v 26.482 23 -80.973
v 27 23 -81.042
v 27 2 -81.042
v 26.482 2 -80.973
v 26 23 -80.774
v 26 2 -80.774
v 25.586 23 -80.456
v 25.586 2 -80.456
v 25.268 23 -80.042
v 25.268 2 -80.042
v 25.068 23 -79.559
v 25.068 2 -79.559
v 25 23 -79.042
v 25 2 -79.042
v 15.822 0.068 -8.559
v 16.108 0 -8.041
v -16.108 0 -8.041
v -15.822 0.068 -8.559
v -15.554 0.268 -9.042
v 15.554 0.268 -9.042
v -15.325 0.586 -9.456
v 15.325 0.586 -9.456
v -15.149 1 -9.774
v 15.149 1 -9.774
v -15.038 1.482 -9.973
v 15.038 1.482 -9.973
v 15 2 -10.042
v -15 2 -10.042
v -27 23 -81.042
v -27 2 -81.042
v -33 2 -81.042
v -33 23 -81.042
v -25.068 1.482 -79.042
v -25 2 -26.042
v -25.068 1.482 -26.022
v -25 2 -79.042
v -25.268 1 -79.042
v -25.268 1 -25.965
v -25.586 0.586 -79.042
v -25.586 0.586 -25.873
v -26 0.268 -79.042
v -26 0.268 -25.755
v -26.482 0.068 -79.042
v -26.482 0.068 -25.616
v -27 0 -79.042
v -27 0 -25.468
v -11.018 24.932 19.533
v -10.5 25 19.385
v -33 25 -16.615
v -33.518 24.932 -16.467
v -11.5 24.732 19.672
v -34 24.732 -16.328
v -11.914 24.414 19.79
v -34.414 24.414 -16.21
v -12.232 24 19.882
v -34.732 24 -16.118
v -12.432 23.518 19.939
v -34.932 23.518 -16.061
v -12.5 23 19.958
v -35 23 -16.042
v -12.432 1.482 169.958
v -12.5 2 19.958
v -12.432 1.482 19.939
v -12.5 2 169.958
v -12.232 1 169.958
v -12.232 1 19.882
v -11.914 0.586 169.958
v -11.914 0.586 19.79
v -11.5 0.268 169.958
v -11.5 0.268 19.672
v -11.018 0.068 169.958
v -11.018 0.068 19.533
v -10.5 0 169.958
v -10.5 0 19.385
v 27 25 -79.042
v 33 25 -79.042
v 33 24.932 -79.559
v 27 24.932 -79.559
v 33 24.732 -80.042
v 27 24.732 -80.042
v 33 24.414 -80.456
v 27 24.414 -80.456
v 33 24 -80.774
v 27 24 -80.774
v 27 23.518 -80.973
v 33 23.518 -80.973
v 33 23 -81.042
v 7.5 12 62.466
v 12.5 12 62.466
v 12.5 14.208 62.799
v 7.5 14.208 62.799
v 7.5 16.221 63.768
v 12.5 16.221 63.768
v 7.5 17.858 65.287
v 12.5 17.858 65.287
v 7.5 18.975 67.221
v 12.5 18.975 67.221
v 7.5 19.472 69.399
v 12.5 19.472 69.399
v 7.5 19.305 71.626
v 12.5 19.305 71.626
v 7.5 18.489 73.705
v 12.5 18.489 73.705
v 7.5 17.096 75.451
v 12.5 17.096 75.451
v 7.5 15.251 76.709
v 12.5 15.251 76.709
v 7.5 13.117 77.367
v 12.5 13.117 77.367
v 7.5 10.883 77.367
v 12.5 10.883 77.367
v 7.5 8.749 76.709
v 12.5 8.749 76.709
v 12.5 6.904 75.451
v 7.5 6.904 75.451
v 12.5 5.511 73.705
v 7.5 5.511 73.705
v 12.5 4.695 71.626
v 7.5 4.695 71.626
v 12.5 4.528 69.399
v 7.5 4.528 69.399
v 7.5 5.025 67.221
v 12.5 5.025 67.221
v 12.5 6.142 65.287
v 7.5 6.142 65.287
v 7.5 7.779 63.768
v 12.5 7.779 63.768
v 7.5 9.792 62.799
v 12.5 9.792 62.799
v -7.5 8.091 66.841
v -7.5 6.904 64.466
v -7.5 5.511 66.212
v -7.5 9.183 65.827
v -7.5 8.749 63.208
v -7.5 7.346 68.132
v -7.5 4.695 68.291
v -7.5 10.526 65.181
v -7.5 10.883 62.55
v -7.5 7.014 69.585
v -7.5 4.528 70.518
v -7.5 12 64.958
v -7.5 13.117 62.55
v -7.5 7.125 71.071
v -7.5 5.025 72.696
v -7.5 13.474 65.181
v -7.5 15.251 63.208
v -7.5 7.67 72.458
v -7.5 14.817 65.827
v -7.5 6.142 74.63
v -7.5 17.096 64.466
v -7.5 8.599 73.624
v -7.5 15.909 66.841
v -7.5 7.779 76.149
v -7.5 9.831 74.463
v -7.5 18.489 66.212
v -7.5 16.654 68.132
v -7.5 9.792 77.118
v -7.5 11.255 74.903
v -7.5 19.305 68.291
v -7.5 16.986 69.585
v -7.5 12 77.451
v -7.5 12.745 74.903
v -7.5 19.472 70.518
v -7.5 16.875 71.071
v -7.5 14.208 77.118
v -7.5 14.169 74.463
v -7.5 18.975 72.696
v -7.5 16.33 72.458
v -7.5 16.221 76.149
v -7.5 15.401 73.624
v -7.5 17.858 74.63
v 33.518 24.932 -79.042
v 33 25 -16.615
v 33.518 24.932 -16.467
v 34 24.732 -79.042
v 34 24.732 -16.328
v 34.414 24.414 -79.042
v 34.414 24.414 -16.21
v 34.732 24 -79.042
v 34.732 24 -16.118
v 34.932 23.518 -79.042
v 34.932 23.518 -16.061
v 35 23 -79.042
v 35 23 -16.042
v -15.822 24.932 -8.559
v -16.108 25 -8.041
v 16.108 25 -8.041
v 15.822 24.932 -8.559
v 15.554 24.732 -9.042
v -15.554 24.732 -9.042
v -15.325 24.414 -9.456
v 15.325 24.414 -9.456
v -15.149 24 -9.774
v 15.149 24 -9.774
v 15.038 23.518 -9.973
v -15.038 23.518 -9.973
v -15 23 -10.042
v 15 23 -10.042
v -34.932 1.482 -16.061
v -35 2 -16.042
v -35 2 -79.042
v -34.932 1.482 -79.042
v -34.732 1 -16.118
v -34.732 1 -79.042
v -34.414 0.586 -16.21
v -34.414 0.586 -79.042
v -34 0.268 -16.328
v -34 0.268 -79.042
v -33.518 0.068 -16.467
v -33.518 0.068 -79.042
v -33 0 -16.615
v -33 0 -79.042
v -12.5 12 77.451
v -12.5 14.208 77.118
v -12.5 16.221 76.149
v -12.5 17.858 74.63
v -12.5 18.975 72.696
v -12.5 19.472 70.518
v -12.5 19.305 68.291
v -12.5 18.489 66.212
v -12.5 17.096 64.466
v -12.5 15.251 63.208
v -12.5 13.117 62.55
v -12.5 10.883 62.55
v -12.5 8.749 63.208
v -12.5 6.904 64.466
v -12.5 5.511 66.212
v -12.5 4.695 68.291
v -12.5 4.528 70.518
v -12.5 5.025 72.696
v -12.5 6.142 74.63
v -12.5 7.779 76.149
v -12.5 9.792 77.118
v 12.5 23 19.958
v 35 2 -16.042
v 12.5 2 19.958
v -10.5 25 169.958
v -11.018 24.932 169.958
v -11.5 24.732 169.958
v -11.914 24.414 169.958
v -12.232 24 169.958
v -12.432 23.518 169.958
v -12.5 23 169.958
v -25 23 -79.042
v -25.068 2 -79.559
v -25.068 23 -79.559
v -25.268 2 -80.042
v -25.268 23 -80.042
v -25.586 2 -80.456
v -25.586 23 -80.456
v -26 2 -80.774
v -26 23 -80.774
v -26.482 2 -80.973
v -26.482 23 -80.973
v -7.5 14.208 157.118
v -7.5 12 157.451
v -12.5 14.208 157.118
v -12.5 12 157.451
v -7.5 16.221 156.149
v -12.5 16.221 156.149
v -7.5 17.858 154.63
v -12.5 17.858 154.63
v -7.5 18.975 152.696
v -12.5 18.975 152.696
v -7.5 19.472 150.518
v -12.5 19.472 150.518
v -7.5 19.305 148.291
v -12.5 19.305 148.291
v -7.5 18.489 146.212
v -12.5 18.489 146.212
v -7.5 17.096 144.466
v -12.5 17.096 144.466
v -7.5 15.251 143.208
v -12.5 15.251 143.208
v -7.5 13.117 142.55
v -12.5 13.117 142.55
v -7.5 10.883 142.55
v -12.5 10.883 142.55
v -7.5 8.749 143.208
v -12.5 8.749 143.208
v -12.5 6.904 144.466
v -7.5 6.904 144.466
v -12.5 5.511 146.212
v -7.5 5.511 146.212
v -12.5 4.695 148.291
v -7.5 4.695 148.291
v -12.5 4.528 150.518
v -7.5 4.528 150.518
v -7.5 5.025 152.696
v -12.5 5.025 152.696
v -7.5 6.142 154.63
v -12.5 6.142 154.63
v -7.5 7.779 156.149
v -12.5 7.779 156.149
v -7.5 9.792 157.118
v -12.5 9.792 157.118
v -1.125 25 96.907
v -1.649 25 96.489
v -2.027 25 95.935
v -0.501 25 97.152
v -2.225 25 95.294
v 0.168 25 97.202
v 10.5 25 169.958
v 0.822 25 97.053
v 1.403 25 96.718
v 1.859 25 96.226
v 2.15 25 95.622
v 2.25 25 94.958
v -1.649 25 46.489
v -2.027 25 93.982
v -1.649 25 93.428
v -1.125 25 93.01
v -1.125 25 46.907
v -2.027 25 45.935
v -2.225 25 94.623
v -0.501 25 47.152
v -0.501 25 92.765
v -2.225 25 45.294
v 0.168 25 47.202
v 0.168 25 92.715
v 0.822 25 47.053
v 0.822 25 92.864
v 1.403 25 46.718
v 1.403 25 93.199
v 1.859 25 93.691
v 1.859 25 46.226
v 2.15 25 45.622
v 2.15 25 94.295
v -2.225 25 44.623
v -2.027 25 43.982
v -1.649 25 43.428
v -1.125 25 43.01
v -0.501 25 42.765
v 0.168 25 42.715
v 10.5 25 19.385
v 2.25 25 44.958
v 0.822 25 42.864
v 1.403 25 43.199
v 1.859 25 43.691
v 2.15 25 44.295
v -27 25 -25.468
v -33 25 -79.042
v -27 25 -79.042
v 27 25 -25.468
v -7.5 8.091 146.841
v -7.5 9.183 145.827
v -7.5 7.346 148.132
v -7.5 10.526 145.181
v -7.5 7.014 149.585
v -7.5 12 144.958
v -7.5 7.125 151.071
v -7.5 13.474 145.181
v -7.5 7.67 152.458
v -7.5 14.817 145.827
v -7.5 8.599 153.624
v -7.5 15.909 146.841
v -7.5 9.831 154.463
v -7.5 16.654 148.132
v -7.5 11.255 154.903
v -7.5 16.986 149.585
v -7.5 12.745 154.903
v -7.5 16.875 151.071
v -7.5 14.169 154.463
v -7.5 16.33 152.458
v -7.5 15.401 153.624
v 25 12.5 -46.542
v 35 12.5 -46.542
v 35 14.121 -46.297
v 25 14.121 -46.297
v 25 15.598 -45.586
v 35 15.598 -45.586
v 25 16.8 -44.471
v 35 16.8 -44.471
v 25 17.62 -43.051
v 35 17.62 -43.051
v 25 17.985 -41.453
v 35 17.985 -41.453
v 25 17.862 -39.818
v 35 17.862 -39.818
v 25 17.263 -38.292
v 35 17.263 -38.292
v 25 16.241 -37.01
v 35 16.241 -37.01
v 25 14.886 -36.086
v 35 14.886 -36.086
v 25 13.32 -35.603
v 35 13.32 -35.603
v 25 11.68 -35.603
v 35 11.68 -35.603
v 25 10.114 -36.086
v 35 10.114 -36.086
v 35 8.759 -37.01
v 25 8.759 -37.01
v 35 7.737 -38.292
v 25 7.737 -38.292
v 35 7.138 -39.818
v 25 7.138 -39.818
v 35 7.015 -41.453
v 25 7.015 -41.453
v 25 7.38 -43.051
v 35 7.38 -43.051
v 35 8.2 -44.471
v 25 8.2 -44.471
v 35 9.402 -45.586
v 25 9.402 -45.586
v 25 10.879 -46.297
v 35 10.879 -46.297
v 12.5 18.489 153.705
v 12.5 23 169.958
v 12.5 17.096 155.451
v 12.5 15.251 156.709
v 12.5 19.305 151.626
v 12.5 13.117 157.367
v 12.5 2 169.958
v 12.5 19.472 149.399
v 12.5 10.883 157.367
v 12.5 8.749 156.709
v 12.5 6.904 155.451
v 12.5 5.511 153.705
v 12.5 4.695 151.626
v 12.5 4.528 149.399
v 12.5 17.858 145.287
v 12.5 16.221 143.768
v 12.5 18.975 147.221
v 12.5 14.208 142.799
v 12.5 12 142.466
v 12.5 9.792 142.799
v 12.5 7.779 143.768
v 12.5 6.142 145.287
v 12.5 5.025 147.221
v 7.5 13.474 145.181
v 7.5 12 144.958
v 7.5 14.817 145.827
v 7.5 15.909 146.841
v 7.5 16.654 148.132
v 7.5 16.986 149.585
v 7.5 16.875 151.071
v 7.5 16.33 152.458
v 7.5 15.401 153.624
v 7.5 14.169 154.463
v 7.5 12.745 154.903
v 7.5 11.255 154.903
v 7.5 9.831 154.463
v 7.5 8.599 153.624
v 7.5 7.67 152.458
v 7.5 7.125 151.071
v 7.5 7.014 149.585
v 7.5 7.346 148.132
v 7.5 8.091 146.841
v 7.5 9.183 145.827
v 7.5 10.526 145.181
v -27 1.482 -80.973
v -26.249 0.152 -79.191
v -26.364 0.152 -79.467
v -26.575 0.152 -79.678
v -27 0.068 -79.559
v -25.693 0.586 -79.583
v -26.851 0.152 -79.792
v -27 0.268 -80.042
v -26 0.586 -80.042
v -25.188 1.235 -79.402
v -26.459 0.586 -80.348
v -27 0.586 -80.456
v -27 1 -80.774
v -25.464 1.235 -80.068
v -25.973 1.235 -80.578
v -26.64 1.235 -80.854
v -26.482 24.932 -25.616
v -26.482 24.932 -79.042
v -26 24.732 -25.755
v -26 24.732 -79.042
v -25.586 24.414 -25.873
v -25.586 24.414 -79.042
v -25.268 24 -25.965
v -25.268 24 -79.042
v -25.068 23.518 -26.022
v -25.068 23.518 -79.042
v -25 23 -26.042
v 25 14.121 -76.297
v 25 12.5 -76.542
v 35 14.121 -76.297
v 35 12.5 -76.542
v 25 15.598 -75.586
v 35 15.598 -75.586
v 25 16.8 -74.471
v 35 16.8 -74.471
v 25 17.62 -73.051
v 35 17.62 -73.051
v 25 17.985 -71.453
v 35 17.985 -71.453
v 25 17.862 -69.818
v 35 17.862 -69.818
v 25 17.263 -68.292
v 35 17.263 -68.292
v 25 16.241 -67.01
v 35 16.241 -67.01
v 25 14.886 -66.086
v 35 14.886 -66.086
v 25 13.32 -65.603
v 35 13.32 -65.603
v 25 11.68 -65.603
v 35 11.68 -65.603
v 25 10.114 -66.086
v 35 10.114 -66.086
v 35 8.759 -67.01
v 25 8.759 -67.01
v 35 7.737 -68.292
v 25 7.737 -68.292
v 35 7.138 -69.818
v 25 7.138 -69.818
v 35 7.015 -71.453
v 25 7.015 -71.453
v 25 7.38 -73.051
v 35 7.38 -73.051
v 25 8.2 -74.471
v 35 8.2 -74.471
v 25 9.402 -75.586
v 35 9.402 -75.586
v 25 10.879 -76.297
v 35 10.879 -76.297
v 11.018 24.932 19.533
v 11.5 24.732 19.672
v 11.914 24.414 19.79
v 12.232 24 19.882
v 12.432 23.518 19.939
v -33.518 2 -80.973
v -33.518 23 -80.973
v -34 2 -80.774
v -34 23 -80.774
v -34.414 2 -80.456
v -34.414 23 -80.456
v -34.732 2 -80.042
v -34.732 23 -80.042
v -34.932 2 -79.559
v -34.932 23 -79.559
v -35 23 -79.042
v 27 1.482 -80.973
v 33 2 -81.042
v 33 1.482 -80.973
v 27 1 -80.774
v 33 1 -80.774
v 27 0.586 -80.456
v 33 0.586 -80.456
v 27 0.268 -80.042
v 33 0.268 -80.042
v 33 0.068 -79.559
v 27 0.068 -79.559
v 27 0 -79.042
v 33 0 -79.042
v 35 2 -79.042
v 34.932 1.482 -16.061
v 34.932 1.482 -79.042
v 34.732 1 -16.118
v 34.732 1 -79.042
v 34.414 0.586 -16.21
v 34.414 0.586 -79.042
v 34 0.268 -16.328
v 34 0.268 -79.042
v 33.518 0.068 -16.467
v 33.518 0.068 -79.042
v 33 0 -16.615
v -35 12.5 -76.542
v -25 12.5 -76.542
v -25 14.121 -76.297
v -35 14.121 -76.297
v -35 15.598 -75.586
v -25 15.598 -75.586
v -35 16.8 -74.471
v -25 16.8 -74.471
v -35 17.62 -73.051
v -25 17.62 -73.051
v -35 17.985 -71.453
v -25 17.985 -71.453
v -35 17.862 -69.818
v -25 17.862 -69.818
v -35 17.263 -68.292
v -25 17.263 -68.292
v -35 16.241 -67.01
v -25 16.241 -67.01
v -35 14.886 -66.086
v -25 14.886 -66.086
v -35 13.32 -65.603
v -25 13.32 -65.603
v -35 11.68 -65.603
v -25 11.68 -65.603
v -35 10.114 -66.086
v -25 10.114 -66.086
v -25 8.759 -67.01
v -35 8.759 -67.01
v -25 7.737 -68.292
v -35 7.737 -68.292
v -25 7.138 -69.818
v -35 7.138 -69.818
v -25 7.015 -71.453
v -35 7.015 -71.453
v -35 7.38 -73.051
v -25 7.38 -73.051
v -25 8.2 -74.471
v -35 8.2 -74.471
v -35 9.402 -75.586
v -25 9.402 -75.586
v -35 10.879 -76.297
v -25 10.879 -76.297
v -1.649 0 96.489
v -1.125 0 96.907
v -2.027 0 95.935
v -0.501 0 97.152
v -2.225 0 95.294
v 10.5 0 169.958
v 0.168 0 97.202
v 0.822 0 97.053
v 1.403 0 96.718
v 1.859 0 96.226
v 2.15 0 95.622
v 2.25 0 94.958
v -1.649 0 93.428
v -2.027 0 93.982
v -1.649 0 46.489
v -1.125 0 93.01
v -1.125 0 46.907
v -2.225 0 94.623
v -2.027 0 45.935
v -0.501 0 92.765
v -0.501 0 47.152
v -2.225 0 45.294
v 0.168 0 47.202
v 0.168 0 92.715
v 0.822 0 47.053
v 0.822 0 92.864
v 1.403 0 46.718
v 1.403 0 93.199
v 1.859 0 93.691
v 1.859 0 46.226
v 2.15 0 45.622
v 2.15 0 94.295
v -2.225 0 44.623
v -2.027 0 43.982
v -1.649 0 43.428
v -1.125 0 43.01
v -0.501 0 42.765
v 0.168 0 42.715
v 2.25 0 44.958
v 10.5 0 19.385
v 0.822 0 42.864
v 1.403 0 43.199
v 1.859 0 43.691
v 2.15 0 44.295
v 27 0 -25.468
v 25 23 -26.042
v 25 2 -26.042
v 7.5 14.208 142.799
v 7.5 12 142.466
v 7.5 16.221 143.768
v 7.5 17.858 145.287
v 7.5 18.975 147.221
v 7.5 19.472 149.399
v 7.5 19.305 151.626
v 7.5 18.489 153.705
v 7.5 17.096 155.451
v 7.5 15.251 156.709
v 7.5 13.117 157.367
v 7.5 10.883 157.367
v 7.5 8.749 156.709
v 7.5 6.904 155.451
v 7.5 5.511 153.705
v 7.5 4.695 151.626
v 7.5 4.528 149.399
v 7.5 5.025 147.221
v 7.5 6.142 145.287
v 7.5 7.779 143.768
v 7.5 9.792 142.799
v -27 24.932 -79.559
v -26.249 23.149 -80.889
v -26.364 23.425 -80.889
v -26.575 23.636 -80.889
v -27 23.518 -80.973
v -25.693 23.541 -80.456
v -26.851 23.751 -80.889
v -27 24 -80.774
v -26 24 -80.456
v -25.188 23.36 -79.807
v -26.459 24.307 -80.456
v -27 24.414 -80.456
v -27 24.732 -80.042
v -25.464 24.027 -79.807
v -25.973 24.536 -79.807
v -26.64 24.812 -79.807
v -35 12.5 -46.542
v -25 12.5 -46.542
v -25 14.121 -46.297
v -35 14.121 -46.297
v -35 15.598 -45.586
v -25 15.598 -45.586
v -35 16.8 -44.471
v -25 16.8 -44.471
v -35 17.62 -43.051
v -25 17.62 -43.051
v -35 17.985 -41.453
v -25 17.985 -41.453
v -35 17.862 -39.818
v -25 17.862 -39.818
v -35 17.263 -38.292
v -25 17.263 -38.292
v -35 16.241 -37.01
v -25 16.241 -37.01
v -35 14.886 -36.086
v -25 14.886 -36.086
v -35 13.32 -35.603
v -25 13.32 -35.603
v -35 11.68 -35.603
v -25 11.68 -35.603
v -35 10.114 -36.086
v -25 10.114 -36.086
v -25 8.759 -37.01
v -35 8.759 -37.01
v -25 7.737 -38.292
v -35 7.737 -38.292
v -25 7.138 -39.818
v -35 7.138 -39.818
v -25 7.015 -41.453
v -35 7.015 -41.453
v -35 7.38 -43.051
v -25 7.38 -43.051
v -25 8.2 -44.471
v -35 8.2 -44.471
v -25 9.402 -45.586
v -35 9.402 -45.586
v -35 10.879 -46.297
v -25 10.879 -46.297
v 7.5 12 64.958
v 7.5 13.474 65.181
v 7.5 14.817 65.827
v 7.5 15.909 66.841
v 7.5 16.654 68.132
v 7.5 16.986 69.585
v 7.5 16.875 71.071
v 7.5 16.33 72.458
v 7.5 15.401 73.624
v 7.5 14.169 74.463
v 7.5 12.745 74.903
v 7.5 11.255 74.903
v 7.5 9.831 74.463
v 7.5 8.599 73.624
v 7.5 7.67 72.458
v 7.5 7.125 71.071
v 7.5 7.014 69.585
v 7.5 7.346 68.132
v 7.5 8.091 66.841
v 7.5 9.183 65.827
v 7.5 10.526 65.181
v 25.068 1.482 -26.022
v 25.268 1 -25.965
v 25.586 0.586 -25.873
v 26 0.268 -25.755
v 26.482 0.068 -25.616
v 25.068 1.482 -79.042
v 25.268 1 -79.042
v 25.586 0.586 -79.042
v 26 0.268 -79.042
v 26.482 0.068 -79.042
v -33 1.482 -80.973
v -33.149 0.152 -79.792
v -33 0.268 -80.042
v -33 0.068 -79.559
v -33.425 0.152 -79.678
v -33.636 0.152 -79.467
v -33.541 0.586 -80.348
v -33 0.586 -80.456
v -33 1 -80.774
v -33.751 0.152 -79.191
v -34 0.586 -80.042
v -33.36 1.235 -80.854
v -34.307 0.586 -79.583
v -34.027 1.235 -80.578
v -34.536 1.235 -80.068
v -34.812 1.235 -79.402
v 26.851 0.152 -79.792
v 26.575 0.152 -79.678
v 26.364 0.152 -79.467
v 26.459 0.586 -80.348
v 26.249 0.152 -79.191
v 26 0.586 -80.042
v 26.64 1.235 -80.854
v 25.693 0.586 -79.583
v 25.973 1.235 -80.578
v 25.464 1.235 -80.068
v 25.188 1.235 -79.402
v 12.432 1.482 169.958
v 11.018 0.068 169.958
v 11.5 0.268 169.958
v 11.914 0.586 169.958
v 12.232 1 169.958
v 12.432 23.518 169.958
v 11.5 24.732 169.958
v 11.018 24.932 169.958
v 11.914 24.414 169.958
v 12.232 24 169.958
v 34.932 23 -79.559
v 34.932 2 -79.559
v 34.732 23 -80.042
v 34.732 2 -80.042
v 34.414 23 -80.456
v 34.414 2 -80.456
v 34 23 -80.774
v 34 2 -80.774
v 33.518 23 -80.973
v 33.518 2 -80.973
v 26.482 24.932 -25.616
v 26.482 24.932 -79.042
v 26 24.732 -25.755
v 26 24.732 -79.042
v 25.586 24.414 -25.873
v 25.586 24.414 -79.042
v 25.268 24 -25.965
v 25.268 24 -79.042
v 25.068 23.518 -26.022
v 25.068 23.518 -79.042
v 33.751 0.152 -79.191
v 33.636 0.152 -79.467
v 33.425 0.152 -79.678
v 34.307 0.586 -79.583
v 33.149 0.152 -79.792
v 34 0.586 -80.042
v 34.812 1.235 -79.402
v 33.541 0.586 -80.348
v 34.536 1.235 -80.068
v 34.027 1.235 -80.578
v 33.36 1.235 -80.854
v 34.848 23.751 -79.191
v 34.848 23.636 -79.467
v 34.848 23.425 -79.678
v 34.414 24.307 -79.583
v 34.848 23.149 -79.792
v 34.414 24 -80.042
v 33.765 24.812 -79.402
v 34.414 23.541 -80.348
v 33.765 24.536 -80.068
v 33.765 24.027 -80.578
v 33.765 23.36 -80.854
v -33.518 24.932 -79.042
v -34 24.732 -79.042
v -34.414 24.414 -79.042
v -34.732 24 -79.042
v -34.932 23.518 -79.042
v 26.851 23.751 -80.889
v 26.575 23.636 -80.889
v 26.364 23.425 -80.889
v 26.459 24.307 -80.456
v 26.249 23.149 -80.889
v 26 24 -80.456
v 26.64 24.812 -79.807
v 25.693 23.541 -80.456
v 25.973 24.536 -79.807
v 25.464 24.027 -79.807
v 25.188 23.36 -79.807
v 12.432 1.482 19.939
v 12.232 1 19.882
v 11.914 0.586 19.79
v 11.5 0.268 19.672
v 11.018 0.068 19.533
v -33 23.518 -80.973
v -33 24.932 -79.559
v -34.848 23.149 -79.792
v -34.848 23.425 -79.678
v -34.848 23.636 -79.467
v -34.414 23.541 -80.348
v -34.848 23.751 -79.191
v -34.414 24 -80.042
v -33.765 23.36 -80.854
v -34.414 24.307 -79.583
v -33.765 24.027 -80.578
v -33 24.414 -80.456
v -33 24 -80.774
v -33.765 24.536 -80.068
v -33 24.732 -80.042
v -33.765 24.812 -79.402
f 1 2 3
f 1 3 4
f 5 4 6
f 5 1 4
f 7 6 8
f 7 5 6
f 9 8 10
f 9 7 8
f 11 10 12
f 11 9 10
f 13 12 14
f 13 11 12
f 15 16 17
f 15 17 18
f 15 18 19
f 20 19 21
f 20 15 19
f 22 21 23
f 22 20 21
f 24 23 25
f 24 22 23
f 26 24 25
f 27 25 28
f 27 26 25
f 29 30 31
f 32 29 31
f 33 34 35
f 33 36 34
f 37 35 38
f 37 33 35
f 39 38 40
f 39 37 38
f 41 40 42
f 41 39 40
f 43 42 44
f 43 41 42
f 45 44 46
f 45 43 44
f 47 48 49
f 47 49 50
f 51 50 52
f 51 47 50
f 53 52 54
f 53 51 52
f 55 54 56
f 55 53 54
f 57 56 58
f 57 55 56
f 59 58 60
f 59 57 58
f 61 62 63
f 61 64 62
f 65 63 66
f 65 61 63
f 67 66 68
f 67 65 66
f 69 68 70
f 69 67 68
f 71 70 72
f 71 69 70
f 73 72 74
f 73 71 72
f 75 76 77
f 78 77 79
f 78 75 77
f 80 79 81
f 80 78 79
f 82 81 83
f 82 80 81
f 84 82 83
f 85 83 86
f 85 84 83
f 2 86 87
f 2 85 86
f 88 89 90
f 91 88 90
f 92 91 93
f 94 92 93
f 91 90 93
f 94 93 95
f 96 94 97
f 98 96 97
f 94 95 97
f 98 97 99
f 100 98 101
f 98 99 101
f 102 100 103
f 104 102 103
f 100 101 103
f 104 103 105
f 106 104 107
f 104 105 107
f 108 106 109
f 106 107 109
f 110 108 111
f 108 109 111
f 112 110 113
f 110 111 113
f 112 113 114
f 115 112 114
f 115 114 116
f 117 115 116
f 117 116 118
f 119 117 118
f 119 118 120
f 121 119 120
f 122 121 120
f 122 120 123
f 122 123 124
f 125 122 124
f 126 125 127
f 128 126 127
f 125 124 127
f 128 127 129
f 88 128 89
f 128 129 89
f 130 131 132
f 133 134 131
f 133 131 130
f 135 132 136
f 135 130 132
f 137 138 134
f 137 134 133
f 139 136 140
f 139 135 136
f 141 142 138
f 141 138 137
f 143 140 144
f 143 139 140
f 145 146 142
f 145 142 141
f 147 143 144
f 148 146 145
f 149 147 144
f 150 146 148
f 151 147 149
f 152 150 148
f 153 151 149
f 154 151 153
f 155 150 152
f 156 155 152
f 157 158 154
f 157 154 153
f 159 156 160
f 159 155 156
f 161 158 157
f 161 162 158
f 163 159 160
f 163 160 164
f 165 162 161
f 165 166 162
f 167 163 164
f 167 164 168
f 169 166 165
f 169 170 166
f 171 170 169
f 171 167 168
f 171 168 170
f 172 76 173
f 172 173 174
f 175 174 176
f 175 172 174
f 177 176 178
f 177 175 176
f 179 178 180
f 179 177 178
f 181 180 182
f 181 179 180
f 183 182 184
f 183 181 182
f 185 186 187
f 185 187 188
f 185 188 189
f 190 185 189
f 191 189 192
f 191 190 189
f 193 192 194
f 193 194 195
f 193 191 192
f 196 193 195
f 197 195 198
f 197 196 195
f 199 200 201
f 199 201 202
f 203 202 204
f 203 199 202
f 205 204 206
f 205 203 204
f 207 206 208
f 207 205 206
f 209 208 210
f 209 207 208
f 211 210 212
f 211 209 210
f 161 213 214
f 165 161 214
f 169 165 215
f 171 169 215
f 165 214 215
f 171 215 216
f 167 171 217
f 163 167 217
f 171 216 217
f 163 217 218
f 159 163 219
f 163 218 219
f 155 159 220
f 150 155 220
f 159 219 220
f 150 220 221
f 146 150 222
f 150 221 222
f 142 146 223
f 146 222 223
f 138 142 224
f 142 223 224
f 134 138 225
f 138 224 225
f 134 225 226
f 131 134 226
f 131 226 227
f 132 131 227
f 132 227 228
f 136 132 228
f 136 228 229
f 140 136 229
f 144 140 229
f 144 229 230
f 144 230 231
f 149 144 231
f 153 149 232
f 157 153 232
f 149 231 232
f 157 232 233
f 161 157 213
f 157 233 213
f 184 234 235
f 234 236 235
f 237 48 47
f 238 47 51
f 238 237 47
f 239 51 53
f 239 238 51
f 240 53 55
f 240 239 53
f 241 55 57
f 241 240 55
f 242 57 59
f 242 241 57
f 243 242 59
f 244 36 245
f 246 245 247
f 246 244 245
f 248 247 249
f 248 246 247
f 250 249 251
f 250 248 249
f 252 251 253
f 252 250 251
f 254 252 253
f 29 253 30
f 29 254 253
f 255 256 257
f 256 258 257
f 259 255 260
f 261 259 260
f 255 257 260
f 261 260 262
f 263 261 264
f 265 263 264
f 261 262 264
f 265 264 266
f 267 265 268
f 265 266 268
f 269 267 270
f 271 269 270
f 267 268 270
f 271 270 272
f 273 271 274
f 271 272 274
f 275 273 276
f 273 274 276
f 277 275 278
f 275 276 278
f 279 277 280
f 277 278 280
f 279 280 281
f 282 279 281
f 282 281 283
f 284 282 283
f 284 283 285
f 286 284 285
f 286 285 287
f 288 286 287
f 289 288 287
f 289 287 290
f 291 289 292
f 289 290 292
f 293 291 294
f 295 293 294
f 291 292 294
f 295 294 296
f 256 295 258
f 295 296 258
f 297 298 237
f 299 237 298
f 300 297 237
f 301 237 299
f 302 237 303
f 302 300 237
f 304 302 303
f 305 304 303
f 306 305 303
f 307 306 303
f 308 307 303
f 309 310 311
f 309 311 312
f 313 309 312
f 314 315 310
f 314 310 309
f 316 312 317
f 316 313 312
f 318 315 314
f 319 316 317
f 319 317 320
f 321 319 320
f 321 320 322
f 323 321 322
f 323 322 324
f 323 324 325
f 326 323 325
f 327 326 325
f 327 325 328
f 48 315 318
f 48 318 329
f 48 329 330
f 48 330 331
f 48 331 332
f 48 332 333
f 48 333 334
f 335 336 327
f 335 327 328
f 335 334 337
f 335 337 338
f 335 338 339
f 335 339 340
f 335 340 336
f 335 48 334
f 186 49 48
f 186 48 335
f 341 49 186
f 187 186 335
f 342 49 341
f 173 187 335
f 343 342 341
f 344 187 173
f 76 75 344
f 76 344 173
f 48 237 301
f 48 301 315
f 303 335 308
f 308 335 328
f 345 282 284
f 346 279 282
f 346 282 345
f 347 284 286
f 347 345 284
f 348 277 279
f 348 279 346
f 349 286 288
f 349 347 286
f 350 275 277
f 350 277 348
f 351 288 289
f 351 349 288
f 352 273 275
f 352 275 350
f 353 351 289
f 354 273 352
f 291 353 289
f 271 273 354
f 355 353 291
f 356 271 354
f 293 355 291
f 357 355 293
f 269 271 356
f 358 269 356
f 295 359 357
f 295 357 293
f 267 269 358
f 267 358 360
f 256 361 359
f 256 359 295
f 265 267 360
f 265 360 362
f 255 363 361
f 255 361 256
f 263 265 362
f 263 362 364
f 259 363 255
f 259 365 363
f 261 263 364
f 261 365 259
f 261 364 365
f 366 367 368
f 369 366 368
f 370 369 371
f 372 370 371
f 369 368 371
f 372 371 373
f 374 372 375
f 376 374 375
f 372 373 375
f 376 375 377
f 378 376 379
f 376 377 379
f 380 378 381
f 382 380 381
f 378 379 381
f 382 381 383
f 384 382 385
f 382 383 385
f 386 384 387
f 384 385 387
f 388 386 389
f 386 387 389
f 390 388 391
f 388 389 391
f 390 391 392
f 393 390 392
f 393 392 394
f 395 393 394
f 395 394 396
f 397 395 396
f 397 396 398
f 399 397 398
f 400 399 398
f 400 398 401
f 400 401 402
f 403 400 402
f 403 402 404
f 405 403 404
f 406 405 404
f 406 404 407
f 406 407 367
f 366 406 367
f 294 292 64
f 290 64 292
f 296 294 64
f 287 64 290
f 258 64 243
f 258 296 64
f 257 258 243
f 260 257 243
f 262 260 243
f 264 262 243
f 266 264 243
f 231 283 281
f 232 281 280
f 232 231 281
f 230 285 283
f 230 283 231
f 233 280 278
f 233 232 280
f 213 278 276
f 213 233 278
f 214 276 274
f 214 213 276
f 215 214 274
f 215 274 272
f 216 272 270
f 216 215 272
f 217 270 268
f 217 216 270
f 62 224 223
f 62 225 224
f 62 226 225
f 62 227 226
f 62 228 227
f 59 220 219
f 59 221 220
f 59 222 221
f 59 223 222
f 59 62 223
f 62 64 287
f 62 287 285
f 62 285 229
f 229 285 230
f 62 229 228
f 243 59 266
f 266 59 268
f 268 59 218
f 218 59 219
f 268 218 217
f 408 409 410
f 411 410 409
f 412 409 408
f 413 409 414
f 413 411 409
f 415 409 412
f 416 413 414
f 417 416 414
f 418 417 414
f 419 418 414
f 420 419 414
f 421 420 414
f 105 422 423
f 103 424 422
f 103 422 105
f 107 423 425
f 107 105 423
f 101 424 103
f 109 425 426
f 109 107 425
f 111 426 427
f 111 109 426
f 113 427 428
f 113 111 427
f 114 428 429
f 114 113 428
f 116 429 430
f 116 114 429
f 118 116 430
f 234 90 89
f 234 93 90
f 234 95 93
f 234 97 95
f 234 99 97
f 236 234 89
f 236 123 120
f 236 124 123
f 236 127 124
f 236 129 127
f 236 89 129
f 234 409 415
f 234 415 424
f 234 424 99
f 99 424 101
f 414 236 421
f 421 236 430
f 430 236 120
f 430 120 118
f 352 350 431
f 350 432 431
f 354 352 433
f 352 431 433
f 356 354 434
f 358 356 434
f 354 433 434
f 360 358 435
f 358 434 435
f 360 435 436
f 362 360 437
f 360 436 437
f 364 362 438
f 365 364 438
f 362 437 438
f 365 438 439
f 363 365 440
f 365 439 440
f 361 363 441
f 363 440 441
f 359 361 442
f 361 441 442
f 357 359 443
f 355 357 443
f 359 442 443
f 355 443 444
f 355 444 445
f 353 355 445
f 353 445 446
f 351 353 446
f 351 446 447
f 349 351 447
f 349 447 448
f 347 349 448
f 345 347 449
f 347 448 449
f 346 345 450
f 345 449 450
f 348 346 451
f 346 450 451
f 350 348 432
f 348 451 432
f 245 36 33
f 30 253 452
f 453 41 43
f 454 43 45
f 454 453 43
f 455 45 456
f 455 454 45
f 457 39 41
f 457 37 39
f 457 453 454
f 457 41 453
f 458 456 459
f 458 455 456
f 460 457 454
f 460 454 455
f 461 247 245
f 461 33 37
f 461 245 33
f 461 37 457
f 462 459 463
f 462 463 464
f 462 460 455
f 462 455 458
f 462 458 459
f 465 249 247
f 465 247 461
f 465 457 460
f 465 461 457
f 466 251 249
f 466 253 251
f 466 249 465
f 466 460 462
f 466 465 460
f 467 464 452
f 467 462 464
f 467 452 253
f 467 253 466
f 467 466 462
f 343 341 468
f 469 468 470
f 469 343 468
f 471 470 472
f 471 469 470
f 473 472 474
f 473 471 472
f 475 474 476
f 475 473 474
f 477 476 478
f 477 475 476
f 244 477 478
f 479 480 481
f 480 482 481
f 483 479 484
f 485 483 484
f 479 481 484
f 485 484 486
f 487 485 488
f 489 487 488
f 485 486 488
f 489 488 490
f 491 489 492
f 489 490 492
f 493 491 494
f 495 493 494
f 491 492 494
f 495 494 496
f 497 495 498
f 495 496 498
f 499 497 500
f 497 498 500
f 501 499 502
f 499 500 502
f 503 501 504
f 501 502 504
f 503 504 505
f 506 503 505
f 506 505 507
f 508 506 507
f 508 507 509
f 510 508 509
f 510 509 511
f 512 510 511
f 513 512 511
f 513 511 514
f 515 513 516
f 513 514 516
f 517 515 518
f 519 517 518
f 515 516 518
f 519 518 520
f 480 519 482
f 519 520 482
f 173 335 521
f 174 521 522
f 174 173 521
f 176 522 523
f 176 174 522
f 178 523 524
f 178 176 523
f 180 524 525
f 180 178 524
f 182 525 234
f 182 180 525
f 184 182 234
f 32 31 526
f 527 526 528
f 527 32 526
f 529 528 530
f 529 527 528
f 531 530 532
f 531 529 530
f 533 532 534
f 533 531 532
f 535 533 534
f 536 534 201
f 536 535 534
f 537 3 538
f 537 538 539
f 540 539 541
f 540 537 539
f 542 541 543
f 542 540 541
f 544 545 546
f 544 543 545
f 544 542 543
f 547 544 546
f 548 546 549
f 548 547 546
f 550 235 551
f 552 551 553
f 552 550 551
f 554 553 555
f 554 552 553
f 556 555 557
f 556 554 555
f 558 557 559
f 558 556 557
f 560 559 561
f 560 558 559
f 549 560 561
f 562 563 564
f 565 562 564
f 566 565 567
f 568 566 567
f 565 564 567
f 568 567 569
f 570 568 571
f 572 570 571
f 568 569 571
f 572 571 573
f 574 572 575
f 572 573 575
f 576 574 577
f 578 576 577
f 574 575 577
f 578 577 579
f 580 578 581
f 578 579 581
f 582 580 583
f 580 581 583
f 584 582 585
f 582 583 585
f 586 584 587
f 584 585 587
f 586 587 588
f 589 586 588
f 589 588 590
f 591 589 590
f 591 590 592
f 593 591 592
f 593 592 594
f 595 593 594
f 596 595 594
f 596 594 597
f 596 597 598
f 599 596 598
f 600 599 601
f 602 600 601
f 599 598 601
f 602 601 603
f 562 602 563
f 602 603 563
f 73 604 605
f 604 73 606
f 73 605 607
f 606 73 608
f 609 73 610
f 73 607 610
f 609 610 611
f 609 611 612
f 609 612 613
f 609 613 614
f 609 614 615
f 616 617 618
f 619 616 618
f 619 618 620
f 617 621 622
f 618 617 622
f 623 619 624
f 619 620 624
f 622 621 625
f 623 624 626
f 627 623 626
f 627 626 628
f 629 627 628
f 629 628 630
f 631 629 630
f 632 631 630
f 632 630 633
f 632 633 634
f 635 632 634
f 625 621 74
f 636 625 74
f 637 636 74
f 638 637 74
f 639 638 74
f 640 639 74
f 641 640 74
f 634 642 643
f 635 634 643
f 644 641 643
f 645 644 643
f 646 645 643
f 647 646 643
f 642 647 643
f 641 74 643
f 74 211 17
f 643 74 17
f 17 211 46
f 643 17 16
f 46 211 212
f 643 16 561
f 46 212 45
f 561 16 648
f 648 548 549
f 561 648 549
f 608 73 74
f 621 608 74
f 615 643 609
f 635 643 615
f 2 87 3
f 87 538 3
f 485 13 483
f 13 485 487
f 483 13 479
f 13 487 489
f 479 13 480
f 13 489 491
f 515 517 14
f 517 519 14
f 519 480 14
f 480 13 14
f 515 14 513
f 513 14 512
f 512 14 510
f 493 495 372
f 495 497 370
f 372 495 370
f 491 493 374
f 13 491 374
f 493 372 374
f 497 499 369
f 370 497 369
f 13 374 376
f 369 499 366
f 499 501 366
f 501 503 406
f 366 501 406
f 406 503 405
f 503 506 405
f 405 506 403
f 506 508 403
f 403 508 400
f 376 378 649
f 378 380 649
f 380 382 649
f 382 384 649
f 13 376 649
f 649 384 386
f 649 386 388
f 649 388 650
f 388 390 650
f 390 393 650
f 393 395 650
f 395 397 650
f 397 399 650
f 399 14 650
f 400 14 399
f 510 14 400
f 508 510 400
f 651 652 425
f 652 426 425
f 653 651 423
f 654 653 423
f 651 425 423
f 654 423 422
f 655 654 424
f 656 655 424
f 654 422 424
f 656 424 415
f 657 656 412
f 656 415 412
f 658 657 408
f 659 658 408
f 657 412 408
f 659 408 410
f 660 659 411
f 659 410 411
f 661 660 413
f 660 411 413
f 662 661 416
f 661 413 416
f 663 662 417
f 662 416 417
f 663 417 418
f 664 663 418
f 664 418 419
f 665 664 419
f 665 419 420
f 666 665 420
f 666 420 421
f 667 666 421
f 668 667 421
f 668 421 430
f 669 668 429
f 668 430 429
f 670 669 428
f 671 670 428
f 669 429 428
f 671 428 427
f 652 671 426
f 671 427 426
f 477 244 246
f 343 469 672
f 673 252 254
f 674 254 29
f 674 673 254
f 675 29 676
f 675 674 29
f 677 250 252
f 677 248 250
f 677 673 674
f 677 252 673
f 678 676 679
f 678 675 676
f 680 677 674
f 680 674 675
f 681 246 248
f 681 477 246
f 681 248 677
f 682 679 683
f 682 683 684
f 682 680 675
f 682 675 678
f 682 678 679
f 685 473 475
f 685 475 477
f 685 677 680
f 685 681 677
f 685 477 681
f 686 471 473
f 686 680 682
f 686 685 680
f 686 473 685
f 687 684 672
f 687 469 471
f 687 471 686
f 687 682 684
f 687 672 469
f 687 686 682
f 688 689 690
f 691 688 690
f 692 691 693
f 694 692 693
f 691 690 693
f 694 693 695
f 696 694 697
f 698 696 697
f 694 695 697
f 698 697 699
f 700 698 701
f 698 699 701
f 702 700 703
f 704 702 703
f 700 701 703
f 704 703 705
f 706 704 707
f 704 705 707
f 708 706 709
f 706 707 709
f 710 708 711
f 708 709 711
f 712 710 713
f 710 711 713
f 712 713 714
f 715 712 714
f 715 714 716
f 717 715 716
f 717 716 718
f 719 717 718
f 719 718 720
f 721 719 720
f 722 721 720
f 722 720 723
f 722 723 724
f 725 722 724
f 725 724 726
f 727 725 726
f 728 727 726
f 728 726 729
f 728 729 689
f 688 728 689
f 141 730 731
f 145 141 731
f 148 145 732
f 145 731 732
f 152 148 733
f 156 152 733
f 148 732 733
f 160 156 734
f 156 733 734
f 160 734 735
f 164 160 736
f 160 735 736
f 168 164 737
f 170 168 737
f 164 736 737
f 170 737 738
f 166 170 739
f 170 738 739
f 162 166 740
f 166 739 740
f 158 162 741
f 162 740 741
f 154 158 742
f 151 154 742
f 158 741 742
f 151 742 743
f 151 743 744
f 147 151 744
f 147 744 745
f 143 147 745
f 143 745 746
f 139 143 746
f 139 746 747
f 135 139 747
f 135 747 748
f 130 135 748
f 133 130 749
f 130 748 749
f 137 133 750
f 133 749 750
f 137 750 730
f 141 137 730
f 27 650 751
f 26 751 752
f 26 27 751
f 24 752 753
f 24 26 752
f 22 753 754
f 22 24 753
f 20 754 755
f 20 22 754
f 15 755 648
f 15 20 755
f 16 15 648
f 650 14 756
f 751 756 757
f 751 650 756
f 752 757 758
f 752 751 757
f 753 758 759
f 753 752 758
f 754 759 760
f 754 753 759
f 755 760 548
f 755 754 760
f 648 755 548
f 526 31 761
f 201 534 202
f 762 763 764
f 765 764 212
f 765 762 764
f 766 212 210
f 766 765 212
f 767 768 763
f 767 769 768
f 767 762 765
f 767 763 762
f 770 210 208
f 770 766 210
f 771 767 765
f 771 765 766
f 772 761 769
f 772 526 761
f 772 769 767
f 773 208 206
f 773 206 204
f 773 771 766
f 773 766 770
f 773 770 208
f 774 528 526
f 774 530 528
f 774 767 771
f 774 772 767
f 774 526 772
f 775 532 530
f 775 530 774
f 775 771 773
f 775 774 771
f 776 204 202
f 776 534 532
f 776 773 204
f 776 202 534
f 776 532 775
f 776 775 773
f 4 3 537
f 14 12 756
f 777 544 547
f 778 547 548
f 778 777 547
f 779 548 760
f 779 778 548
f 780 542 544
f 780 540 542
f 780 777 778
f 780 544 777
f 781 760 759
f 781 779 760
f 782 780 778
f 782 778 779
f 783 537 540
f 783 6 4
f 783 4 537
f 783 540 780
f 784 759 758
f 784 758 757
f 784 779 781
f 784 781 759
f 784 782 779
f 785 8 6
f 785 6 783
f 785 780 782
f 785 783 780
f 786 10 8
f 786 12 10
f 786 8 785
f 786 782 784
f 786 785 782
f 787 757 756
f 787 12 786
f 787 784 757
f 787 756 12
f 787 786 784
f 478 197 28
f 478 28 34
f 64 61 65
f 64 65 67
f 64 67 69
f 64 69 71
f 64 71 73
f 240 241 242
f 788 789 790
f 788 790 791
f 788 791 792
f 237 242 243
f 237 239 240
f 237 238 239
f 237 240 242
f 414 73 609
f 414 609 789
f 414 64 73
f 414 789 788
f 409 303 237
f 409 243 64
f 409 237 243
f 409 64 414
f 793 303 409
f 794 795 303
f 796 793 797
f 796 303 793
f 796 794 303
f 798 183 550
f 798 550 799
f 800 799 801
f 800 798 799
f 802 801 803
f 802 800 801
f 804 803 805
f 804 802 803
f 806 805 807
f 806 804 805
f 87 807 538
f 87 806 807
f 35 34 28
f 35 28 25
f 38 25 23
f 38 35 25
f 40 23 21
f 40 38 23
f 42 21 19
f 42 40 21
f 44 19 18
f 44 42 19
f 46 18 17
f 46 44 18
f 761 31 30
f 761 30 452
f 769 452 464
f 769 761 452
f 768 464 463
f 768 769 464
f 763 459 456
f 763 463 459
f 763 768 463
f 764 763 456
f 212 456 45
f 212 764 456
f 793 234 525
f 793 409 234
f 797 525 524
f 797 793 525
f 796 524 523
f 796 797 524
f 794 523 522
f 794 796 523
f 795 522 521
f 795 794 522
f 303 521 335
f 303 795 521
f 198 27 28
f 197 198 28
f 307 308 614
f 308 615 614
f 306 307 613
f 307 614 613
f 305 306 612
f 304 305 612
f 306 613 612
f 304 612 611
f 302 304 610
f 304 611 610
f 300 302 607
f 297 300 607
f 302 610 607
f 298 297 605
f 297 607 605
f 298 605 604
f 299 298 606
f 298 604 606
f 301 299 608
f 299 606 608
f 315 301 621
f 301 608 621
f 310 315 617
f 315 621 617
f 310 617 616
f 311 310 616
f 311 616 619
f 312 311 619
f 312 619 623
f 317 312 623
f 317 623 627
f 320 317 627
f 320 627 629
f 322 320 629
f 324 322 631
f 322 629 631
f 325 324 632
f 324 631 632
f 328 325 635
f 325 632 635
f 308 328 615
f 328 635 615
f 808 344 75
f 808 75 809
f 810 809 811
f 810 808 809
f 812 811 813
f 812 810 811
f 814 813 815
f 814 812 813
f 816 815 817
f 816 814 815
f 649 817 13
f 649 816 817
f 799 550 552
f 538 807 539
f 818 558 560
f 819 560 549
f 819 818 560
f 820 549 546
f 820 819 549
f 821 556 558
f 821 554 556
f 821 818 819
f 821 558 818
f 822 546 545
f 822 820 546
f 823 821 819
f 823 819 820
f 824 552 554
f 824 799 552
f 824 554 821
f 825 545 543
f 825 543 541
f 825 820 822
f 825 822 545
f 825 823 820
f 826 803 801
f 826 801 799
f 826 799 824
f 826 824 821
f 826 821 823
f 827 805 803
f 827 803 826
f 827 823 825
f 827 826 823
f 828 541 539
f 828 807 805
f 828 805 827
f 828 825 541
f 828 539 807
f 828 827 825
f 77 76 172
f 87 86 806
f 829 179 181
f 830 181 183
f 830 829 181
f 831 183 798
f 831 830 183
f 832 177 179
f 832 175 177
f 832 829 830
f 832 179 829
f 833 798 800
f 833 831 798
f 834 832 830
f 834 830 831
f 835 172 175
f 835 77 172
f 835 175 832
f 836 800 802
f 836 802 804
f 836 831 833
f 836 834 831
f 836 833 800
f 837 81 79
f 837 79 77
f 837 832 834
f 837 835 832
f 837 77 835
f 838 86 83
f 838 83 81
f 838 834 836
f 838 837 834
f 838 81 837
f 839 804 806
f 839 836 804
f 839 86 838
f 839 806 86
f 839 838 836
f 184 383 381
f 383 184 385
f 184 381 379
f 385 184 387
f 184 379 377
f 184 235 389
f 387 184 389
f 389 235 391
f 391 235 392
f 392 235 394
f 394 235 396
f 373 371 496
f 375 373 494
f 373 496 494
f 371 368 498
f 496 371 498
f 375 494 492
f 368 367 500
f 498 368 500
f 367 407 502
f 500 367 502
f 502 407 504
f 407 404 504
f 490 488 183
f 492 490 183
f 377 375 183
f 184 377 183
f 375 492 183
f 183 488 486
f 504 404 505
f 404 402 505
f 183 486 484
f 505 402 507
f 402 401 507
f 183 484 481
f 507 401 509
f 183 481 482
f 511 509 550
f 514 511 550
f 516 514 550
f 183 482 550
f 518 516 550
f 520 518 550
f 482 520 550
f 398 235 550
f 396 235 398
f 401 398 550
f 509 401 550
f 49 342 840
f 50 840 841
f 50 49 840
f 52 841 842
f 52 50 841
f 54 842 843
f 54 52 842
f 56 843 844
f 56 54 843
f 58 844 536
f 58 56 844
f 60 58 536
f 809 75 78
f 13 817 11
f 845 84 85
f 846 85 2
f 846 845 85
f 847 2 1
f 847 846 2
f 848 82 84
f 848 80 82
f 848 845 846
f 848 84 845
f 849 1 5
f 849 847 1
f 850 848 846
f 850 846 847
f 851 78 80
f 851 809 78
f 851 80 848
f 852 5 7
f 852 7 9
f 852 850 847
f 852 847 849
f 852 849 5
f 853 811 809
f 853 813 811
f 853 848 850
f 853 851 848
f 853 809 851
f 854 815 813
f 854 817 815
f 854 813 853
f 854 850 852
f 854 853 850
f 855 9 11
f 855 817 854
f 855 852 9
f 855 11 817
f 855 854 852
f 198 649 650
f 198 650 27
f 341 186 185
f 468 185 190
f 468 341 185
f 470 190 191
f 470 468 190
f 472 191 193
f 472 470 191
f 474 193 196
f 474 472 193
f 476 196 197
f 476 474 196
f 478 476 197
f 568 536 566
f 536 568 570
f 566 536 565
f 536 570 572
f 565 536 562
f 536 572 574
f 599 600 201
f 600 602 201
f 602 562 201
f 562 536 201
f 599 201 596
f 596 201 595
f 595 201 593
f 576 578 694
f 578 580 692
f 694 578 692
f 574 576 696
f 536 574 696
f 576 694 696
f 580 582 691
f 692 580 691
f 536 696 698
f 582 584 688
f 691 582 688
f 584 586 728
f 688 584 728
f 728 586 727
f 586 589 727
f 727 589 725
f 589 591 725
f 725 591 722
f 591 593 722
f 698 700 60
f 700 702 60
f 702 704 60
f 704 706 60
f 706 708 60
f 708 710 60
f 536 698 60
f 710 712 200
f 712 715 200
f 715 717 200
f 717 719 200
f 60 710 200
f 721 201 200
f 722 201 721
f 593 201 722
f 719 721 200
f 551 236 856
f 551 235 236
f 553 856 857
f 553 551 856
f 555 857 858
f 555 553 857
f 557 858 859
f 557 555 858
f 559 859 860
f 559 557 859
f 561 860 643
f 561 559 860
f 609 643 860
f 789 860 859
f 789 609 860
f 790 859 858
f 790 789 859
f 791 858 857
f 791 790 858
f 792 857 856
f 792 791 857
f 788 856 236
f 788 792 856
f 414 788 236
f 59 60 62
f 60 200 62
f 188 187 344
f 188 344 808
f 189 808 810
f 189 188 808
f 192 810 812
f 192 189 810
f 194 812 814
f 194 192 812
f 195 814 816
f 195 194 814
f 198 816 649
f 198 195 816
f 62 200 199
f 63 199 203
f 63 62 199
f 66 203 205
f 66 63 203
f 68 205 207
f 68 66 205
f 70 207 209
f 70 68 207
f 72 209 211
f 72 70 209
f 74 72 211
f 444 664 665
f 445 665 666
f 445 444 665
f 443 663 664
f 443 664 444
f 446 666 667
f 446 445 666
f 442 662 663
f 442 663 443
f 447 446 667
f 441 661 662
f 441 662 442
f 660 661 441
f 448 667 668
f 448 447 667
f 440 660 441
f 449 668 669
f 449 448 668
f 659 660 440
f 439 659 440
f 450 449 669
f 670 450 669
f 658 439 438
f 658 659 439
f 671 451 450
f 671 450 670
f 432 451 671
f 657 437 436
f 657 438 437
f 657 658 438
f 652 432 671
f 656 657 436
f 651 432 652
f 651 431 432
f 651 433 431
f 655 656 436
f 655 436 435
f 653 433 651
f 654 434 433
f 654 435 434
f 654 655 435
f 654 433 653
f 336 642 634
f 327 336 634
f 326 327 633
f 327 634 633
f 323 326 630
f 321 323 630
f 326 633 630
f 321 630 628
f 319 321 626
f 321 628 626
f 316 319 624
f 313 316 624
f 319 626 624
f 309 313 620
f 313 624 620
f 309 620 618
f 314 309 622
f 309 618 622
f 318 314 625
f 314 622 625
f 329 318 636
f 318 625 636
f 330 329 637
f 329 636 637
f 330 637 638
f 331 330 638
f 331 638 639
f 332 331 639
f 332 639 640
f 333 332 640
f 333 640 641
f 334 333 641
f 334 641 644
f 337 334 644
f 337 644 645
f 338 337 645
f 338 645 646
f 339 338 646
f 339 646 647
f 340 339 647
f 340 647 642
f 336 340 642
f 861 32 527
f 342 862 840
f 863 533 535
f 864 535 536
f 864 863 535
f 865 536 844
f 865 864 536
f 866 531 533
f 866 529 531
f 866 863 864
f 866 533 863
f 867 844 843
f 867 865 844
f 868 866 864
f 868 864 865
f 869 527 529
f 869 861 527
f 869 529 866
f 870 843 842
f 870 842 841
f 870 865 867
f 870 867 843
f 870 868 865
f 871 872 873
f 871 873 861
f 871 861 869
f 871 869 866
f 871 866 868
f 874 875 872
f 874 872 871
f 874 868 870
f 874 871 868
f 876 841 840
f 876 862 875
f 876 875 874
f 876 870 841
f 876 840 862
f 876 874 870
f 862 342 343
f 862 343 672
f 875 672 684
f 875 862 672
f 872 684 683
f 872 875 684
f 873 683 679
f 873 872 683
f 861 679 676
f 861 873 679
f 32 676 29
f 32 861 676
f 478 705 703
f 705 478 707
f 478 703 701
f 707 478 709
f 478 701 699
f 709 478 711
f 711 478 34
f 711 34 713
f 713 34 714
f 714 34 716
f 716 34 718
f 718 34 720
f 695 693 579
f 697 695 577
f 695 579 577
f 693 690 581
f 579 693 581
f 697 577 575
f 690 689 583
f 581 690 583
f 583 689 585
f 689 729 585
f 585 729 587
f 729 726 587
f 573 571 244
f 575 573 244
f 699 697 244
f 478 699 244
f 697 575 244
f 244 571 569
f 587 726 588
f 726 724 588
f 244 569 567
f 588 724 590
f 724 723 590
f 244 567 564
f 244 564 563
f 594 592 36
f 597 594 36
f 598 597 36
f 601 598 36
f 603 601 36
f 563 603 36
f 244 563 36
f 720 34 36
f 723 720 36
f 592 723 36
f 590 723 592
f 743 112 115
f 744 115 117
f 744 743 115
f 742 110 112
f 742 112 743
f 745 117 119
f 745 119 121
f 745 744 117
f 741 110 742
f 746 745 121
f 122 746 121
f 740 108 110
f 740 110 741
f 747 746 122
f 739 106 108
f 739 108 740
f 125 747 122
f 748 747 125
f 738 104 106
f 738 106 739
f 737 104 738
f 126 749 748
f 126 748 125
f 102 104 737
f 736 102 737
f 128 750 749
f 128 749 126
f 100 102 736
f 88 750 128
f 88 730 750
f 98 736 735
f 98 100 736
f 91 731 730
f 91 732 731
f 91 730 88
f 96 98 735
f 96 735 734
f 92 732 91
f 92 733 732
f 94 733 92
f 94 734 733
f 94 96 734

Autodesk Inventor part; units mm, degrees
ref_plane "YZ Plane" through (0, 0, 0) normal (1, 0, 0) x (0, 1, 0)
ref_plane "XZ Plane" through (0, 0, 0) normal (0, 1, 0) x (-1, 0, 0)
ref_plane "XY Plane" through (0, 0, 0) normal (0, 0, 1) x (1, 0, 0)
sketch "Skizze1" plane through (0, 0, 0) normal (0, 1, 0) x (-1, 0, 0)
  line L0 (-12.5, 19.9585) -> (-35, -16.0415)
  line L1 (-35, -16.0415) -> (-35, -81.0415)
  line L2 (-35, -81.0415) -> (-25, -81.0415)
  line L3 (-25, -81.0415) -> (-25, -26.0415)
  line L4 (-25, -26.0415) -> (-15, -10.0415)
  line L5 (-15, -10.0415) -> (15, -10.0415)
  line L6 (15, -10.0415) -> (25, -26.0415)
  line L7 (25, -26.0415) -> (25, -81.0415)
  line L8 (25, -81.0415) -> (35, -81.0415)
  line L9 (35, -81.0415) -> (35, -16.0415)
  line L10 (35, -16.0415) -> (12.5, 19.9585)
  line L11 (0, -101.2415) -> (0, 40.1585) projected
  line L12 (12.5, 19.9585) -> (-12.5, 19.9585)
  point P0 (0, 0)
  dimension "d0" = 10
  dimension "d1" = 10
  dimension "d4" = 30
  dimension "d5" = 15
  dimension "d6" = 70
  dimension "d7" = 55
  dimension "d8" = 55
  dimension "d9" = 65
  dimension "d10" = 65
  dimension "d11" = 10
  dimension "d13" = 25
  dimension "d14" = 30
  dimension "d15" = 30
  dimension "d16" = 50
extrude "Extrusion1" add sketch "Skizze1" along normal blind 25
sketch "Skizze2" plane through (-12.5, 0, 19.9585) normal (0, 0, 1) x (1, 0, 0)
  line L0 (-22.5, 25) -> (0, 25) projected
  line L1 (0, 0) -> (25, 0) projected
  line L2 (0, 25) -> (25, 25)
  line L3 (25, 25) -> (25, 0)
  line L4 (25, 0) -> (0, 0)
  line L5 (0, 0) -> (0, 25)
  point P0 (12.5, 0)
extrude "Extrusion2" add sketch "Skizze2" along normal blind 150
sketch "Skizze3" plane through (35, 0, -16.0415) normal (1, 0, 0) x (0, 0, -1)
  circle A0 centre (55, 12.5) radius 5.5
  circle A1 centre (25, 12.5) radius 5.5
  line L0 (-236.2, 0) -> (115.2, 0) projected
  line L1 (65, 0) -> (65, 25) projected
  point P0 (-16.0415, 0)
  dimension "d21" = 12.5
  dimension "d22" = 12.5
  dimension "d23" = 30
  dimension "d24" = 11
  dimension "d25" = 11
  dimension "d26" = 10
extrude "Extrusion3" cut sketch "Skizze3" against normal blind 300
fillet "Rundung1" radius 2 30 edges at (-20, 25, -18.0415) (0, 25, -10.0415) (-25, 25, -53.5415) (20, 25, -18.0415) (25, 25, -53.5415) (30, 25, -81.0415) (-30, 25, -81.0415) (-35, 25, -48.5415) (-23.75, 25, 1.9585) (23.75, 25, 1.9585) (12.5, 25, 94.9585) (-12.5, 25, 94.9585) (-25, 12.5, -81.0415) (-35, 12.5, -81.0415) (25, 12.5, -81.0415) (35, 12.5, -81.0415) (35, 25, -48.5415) (30, 0, -81.0415) (35, 0, -48.5415) (25, 0, -53.5415) (20, 0, -18.0415) (0, 0, -10.0415) (-20, 0, -18.0415) (-25, 0, -53.5415) (-30, 0, -81.0415) (-35, 0, -48.5415) (23.75, 0, 1.9585) (-23.75, 0, 1.9585) (-12.5, 0, 94.9585) (12.5, 0, 94.9585)
sketch "Skizze4" plane through (12.5, 2, 169.9585) normal (1, 0, 0) x (0, 0, -1)
  circle A0 centre (20, 10) radius 5
  circle A1 centre (100, 10) radius 5
  line L0 (0, 0) -> (0, 21) projected
  line L1 (0, -2) -> (150.5736, -2) projected
  point P0 (169.9585, -2)
  dimension "d31" = 10
  dimension "d32" = 10
  dimension "d33" = 20
  dimension "d34" = 80
  dimension "d35" = 12
  dimension "d36" = 12
extrude "Extrusion4" cut sketch "Skizze4" against normal blind 29
sketch "Skizze5" plane through (0, 0, 0) normal (0, -1, 0) x (1, 0, 0)
  circle A0 centre (0, 44.9585) radius 2.25
  circle A1 centre (0, 94.9585) radius 2.25
  line L0 (12.5, 19.9585) -> (12.5, 169.9585) projected
  line L1 (-10.5, 169.9585) -> (10.5, 169.9585) projected
  point P0 (0, 0)
  dimension "d39" = 4.5
  dimension "d40" = 4.5
  dimension "d41" = 50
  dimension "d42" = 12.5
  dimension "d43" = 12.5
  dimension "d44" = 75
extrude "Extrusion5" cut sketch "Skizze5" against normal blind 30
sketch "Skizze6" plane through (12.5, 2, 169.9585) normal (1, 0, 0) x (0, 0, -1)
  circle A0 centre (100, 10) radius 5 projected
  circle A1 centre (100, 10) radius 7.4925
  circle A2 centre (20, 10) radius 5 projected
  circle A3 centre (20, 10) radius 7.4925
  point P0 (169.9585, -2)
  dimension "d47" = 14.985
  dimension "d48" = 14.985
extrude "Extrusion6" cut sketch "Skizze6" against normal blind 5
sketch "Skizze7" plane through (-12.5, 2, 19.9585) normal (-1, 0, 0) x (0, 0, 1)
  circle A0 centre (130, 10) radius 5 projected
  circle A1 centre (130, 10) radius 7.4925
  circle A2 centre (50, 10) radius 5 projected
  circle A3 centre (50, 10) radius 7.4925
  point P0 (-19.9585, -2)
  dimension "d51" = 14.985
  dimension "d52" = 14.985
extrude "Extrusion7" cut sketch "Skizze7" against normal blind 5
properties part number "basisachse"
